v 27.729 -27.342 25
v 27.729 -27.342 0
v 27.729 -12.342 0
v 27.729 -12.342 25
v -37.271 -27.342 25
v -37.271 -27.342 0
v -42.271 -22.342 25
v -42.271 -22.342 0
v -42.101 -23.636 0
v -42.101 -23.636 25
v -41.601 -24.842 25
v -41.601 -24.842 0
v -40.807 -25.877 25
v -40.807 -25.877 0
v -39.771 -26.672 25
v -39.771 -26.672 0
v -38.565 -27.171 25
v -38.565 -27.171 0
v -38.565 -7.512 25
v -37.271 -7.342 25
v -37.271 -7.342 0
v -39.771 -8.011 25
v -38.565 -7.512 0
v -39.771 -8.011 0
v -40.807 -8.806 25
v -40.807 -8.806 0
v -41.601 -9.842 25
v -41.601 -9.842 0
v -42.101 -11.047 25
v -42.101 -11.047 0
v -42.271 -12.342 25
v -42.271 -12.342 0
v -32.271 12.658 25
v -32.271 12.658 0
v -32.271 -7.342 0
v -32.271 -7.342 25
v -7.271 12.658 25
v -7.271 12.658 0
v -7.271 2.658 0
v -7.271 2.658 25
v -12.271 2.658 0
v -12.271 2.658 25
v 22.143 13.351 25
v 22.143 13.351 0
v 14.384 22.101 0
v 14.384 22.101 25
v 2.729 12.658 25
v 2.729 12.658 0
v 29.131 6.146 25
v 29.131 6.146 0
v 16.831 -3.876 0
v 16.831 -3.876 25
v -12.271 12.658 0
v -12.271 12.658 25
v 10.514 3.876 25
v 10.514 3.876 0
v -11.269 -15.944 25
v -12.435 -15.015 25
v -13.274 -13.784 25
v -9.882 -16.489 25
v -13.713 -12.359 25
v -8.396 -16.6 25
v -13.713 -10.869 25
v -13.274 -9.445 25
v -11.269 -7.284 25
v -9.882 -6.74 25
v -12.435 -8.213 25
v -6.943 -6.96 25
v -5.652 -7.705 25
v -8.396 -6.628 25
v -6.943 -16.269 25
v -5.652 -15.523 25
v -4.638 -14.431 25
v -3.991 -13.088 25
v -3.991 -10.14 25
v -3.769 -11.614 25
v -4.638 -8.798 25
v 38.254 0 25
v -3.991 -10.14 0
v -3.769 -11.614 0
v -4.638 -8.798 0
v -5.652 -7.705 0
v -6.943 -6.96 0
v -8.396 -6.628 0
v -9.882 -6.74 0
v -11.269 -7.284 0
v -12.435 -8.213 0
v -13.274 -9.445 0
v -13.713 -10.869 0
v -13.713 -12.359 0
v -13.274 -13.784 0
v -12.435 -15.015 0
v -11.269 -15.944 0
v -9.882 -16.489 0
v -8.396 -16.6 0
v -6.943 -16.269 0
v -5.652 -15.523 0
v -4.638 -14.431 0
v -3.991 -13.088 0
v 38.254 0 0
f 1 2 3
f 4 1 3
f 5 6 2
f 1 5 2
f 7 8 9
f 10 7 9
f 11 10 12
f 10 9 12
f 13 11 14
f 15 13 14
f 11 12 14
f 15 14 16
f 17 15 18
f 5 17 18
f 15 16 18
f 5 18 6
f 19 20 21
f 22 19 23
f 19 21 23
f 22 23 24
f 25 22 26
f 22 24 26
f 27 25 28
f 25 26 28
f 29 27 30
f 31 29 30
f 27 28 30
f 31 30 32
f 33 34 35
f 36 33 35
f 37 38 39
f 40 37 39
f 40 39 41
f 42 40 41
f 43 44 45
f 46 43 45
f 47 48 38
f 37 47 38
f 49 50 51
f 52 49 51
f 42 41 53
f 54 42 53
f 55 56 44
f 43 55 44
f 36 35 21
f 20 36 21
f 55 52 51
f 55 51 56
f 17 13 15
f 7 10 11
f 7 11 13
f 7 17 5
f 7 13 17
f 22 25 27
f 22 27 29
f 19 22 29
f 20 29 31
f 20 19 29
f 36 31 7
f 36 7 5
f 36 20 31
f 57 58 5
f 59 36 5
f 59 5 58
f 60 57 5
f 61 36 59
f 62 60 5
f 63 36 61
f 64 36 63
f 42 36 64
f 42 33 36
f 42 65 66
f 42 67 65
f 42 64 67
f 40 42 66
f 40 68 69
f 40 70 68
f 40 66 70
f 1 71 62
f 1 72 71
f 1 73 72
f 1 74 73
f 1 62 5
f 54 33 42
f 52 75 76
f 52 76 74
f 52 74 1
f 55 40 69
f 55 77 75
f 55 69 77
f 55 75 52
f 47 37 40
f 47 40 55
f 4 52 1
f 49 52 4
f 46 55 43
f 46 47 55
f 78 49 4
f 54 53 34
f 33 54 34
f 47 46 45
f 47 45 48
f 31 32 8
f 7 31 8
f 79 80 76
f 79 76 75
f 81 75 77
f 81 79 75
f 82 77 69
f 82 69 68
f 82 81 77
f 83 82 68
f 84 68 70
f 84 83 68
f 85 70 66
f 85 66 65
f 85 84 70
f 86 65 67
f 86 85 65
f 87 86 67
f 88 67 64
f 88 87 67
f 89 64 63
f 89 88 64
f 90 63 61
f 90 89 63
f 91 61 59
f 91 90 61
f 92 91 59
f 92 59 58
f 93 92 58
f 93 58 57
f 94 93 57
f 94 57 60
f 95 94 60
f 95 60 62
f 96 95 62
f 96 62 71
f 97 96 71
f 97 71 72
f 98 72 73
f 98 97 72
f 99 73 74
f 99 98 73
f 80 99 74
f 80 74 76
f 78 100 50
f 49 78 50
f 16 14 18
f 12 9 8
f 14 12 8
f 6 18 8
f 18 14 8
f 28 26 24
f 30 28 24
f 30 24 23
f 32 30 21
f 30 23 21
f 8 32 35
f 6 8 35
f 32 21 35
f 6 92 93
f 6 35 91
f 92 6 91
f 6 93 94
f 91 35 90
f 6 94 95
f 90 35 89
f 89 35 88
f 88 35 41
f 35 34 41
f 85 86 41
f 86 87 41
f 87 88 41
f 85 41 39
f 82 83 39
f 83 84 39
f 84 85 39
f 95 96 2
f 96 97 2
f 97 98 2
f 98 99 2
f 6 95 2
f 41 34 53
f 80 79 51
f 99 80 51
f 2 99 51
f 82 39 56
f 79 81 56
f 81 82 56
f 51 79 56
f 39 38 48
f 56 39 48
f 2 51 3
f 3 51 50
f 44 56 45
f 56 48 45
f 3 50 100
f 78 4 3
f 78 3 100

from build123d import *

# Parameters (mm, degrees)
F0_R     = 5
F1_DEPTH = 25
F2_DEPTH = 25


with BuildPart() as f1:
    # F0 (on Top) → F1 (new body)
    with BuildSketch(Plane.XY):
        with BuildLine():
            Line((-37.271081, -27.341548), (27.728919, -27.341548))
            Line((27.728919, -27.341548), (27.728919, -12.341548))
            Line((27.728919, -12.341548), (38.254101, 0))
            Line((38.254101, 0), (29.131456, 6.146329))
            Line((29.131456, 6.146329), (16.831115, -3.876174))
            Line((16.831115, -3.876174), (10.514384, 3.876174))
            Line((10.514384, 3.876174), (22.142908, 13.35127))
            Line((22.142908, 13.35127), (14.383989, 22.100874))
            Line((14.383989, 22.100874), (2.728919, 12.658452))
            Line((2.728919, 12.658452), (-7.271081, 12.658452))
            Line((-7.271081, 12.658452), (-7.271081, 2.658452))
            Line((-7.271081, 2.658452), (-12.271081, 2.658452))
            Line((-12.271081, 2.658452), (-12.271081, 12.658452))
            Line((-12.271081, 12.658452), (-32.271081, 12.658452))
            Line((-32.271081, 12.658452), (-32.271081, -7.341548))
            Line((-32.271081, -7.341548), (-37.271081, -7.341548))
            ThreePointArc((-37.271081, -7.341548), (-40.806615, -8.806014), (-42.271081, -12.341548))
            Line((-42.271081, -12.341548), (-42.271081, -22.341548))
            ThreePointArc((-42.271081, -22.341548), (-40.806615, -25.877082), (-37.271081, -27.341548))
        make_face()
        with Locations((-8.769282, -11.614208)):
            Circle(F0_R, mode=Mode.SUBTRACT)
    extrude(amount=F1_DEPTH)

    # F0 (on Top) → F2 (join)
    with BuildSketch(Plane.XY):
        with BuildLine():
            Line((-37.271081, -27.341548), (27.728919, -27.341548))
            Line((27.728919, -27.341548), (27.728919, -12.341548))
            Line((27.728919, -12.341548), (38.254101, 0))
            Line((38.254101, 0), (29.131456, 6.146329))
            Line((29.131456, 6.146329), (16.831115, -3.876174))
            Line((16.831115, -3.876174), (10.514384, 3.876174))
            Line((10.514384, 3.876174), (22.142908, 13.35127))
            Line((22.142908, 13.35127), (14.383989, 22.100874))
            Line((14.383989, 22.100874), (2.728919, 12.658452))
            Line((2.728919, 12.658452), (-7.271081, 12.658452))
            Line((-7.271081, 12.658452), (-7.271081, 2.658452))
            Line((-7.271081, 2.658452), (-12.271081, 2.658452))
            Line((-12.271081, 2.658452), (-12.271081, 12.658452))
            Line((-12.271081, 12.658452), (-32.271081, 12.658452))
            Line((-32.271081, 12.658452), (-32.271081, -7.341548))
            Line((-32.271081, -7.341548), (-37.271081, -7.341548))
            ThreePointArc((-37.271081, -7.341548), (-40.806615, -8.806014), (-42.271081, -12.341548))
            Line((-42.271081, -12.341548), (-42.271081, -22.341548))
            ThreePointArc((-42.271081, -22.341548), (-40.806615, -25.877082), (-37.271081, -27.341548))
        make_face()
        with Locations((-8.769282, -11.614208)):
            Circle(F0_R, mode=Mode.SUBTRACT)
    extrude(amount=F2_DEPTH)


solid = f1.part
